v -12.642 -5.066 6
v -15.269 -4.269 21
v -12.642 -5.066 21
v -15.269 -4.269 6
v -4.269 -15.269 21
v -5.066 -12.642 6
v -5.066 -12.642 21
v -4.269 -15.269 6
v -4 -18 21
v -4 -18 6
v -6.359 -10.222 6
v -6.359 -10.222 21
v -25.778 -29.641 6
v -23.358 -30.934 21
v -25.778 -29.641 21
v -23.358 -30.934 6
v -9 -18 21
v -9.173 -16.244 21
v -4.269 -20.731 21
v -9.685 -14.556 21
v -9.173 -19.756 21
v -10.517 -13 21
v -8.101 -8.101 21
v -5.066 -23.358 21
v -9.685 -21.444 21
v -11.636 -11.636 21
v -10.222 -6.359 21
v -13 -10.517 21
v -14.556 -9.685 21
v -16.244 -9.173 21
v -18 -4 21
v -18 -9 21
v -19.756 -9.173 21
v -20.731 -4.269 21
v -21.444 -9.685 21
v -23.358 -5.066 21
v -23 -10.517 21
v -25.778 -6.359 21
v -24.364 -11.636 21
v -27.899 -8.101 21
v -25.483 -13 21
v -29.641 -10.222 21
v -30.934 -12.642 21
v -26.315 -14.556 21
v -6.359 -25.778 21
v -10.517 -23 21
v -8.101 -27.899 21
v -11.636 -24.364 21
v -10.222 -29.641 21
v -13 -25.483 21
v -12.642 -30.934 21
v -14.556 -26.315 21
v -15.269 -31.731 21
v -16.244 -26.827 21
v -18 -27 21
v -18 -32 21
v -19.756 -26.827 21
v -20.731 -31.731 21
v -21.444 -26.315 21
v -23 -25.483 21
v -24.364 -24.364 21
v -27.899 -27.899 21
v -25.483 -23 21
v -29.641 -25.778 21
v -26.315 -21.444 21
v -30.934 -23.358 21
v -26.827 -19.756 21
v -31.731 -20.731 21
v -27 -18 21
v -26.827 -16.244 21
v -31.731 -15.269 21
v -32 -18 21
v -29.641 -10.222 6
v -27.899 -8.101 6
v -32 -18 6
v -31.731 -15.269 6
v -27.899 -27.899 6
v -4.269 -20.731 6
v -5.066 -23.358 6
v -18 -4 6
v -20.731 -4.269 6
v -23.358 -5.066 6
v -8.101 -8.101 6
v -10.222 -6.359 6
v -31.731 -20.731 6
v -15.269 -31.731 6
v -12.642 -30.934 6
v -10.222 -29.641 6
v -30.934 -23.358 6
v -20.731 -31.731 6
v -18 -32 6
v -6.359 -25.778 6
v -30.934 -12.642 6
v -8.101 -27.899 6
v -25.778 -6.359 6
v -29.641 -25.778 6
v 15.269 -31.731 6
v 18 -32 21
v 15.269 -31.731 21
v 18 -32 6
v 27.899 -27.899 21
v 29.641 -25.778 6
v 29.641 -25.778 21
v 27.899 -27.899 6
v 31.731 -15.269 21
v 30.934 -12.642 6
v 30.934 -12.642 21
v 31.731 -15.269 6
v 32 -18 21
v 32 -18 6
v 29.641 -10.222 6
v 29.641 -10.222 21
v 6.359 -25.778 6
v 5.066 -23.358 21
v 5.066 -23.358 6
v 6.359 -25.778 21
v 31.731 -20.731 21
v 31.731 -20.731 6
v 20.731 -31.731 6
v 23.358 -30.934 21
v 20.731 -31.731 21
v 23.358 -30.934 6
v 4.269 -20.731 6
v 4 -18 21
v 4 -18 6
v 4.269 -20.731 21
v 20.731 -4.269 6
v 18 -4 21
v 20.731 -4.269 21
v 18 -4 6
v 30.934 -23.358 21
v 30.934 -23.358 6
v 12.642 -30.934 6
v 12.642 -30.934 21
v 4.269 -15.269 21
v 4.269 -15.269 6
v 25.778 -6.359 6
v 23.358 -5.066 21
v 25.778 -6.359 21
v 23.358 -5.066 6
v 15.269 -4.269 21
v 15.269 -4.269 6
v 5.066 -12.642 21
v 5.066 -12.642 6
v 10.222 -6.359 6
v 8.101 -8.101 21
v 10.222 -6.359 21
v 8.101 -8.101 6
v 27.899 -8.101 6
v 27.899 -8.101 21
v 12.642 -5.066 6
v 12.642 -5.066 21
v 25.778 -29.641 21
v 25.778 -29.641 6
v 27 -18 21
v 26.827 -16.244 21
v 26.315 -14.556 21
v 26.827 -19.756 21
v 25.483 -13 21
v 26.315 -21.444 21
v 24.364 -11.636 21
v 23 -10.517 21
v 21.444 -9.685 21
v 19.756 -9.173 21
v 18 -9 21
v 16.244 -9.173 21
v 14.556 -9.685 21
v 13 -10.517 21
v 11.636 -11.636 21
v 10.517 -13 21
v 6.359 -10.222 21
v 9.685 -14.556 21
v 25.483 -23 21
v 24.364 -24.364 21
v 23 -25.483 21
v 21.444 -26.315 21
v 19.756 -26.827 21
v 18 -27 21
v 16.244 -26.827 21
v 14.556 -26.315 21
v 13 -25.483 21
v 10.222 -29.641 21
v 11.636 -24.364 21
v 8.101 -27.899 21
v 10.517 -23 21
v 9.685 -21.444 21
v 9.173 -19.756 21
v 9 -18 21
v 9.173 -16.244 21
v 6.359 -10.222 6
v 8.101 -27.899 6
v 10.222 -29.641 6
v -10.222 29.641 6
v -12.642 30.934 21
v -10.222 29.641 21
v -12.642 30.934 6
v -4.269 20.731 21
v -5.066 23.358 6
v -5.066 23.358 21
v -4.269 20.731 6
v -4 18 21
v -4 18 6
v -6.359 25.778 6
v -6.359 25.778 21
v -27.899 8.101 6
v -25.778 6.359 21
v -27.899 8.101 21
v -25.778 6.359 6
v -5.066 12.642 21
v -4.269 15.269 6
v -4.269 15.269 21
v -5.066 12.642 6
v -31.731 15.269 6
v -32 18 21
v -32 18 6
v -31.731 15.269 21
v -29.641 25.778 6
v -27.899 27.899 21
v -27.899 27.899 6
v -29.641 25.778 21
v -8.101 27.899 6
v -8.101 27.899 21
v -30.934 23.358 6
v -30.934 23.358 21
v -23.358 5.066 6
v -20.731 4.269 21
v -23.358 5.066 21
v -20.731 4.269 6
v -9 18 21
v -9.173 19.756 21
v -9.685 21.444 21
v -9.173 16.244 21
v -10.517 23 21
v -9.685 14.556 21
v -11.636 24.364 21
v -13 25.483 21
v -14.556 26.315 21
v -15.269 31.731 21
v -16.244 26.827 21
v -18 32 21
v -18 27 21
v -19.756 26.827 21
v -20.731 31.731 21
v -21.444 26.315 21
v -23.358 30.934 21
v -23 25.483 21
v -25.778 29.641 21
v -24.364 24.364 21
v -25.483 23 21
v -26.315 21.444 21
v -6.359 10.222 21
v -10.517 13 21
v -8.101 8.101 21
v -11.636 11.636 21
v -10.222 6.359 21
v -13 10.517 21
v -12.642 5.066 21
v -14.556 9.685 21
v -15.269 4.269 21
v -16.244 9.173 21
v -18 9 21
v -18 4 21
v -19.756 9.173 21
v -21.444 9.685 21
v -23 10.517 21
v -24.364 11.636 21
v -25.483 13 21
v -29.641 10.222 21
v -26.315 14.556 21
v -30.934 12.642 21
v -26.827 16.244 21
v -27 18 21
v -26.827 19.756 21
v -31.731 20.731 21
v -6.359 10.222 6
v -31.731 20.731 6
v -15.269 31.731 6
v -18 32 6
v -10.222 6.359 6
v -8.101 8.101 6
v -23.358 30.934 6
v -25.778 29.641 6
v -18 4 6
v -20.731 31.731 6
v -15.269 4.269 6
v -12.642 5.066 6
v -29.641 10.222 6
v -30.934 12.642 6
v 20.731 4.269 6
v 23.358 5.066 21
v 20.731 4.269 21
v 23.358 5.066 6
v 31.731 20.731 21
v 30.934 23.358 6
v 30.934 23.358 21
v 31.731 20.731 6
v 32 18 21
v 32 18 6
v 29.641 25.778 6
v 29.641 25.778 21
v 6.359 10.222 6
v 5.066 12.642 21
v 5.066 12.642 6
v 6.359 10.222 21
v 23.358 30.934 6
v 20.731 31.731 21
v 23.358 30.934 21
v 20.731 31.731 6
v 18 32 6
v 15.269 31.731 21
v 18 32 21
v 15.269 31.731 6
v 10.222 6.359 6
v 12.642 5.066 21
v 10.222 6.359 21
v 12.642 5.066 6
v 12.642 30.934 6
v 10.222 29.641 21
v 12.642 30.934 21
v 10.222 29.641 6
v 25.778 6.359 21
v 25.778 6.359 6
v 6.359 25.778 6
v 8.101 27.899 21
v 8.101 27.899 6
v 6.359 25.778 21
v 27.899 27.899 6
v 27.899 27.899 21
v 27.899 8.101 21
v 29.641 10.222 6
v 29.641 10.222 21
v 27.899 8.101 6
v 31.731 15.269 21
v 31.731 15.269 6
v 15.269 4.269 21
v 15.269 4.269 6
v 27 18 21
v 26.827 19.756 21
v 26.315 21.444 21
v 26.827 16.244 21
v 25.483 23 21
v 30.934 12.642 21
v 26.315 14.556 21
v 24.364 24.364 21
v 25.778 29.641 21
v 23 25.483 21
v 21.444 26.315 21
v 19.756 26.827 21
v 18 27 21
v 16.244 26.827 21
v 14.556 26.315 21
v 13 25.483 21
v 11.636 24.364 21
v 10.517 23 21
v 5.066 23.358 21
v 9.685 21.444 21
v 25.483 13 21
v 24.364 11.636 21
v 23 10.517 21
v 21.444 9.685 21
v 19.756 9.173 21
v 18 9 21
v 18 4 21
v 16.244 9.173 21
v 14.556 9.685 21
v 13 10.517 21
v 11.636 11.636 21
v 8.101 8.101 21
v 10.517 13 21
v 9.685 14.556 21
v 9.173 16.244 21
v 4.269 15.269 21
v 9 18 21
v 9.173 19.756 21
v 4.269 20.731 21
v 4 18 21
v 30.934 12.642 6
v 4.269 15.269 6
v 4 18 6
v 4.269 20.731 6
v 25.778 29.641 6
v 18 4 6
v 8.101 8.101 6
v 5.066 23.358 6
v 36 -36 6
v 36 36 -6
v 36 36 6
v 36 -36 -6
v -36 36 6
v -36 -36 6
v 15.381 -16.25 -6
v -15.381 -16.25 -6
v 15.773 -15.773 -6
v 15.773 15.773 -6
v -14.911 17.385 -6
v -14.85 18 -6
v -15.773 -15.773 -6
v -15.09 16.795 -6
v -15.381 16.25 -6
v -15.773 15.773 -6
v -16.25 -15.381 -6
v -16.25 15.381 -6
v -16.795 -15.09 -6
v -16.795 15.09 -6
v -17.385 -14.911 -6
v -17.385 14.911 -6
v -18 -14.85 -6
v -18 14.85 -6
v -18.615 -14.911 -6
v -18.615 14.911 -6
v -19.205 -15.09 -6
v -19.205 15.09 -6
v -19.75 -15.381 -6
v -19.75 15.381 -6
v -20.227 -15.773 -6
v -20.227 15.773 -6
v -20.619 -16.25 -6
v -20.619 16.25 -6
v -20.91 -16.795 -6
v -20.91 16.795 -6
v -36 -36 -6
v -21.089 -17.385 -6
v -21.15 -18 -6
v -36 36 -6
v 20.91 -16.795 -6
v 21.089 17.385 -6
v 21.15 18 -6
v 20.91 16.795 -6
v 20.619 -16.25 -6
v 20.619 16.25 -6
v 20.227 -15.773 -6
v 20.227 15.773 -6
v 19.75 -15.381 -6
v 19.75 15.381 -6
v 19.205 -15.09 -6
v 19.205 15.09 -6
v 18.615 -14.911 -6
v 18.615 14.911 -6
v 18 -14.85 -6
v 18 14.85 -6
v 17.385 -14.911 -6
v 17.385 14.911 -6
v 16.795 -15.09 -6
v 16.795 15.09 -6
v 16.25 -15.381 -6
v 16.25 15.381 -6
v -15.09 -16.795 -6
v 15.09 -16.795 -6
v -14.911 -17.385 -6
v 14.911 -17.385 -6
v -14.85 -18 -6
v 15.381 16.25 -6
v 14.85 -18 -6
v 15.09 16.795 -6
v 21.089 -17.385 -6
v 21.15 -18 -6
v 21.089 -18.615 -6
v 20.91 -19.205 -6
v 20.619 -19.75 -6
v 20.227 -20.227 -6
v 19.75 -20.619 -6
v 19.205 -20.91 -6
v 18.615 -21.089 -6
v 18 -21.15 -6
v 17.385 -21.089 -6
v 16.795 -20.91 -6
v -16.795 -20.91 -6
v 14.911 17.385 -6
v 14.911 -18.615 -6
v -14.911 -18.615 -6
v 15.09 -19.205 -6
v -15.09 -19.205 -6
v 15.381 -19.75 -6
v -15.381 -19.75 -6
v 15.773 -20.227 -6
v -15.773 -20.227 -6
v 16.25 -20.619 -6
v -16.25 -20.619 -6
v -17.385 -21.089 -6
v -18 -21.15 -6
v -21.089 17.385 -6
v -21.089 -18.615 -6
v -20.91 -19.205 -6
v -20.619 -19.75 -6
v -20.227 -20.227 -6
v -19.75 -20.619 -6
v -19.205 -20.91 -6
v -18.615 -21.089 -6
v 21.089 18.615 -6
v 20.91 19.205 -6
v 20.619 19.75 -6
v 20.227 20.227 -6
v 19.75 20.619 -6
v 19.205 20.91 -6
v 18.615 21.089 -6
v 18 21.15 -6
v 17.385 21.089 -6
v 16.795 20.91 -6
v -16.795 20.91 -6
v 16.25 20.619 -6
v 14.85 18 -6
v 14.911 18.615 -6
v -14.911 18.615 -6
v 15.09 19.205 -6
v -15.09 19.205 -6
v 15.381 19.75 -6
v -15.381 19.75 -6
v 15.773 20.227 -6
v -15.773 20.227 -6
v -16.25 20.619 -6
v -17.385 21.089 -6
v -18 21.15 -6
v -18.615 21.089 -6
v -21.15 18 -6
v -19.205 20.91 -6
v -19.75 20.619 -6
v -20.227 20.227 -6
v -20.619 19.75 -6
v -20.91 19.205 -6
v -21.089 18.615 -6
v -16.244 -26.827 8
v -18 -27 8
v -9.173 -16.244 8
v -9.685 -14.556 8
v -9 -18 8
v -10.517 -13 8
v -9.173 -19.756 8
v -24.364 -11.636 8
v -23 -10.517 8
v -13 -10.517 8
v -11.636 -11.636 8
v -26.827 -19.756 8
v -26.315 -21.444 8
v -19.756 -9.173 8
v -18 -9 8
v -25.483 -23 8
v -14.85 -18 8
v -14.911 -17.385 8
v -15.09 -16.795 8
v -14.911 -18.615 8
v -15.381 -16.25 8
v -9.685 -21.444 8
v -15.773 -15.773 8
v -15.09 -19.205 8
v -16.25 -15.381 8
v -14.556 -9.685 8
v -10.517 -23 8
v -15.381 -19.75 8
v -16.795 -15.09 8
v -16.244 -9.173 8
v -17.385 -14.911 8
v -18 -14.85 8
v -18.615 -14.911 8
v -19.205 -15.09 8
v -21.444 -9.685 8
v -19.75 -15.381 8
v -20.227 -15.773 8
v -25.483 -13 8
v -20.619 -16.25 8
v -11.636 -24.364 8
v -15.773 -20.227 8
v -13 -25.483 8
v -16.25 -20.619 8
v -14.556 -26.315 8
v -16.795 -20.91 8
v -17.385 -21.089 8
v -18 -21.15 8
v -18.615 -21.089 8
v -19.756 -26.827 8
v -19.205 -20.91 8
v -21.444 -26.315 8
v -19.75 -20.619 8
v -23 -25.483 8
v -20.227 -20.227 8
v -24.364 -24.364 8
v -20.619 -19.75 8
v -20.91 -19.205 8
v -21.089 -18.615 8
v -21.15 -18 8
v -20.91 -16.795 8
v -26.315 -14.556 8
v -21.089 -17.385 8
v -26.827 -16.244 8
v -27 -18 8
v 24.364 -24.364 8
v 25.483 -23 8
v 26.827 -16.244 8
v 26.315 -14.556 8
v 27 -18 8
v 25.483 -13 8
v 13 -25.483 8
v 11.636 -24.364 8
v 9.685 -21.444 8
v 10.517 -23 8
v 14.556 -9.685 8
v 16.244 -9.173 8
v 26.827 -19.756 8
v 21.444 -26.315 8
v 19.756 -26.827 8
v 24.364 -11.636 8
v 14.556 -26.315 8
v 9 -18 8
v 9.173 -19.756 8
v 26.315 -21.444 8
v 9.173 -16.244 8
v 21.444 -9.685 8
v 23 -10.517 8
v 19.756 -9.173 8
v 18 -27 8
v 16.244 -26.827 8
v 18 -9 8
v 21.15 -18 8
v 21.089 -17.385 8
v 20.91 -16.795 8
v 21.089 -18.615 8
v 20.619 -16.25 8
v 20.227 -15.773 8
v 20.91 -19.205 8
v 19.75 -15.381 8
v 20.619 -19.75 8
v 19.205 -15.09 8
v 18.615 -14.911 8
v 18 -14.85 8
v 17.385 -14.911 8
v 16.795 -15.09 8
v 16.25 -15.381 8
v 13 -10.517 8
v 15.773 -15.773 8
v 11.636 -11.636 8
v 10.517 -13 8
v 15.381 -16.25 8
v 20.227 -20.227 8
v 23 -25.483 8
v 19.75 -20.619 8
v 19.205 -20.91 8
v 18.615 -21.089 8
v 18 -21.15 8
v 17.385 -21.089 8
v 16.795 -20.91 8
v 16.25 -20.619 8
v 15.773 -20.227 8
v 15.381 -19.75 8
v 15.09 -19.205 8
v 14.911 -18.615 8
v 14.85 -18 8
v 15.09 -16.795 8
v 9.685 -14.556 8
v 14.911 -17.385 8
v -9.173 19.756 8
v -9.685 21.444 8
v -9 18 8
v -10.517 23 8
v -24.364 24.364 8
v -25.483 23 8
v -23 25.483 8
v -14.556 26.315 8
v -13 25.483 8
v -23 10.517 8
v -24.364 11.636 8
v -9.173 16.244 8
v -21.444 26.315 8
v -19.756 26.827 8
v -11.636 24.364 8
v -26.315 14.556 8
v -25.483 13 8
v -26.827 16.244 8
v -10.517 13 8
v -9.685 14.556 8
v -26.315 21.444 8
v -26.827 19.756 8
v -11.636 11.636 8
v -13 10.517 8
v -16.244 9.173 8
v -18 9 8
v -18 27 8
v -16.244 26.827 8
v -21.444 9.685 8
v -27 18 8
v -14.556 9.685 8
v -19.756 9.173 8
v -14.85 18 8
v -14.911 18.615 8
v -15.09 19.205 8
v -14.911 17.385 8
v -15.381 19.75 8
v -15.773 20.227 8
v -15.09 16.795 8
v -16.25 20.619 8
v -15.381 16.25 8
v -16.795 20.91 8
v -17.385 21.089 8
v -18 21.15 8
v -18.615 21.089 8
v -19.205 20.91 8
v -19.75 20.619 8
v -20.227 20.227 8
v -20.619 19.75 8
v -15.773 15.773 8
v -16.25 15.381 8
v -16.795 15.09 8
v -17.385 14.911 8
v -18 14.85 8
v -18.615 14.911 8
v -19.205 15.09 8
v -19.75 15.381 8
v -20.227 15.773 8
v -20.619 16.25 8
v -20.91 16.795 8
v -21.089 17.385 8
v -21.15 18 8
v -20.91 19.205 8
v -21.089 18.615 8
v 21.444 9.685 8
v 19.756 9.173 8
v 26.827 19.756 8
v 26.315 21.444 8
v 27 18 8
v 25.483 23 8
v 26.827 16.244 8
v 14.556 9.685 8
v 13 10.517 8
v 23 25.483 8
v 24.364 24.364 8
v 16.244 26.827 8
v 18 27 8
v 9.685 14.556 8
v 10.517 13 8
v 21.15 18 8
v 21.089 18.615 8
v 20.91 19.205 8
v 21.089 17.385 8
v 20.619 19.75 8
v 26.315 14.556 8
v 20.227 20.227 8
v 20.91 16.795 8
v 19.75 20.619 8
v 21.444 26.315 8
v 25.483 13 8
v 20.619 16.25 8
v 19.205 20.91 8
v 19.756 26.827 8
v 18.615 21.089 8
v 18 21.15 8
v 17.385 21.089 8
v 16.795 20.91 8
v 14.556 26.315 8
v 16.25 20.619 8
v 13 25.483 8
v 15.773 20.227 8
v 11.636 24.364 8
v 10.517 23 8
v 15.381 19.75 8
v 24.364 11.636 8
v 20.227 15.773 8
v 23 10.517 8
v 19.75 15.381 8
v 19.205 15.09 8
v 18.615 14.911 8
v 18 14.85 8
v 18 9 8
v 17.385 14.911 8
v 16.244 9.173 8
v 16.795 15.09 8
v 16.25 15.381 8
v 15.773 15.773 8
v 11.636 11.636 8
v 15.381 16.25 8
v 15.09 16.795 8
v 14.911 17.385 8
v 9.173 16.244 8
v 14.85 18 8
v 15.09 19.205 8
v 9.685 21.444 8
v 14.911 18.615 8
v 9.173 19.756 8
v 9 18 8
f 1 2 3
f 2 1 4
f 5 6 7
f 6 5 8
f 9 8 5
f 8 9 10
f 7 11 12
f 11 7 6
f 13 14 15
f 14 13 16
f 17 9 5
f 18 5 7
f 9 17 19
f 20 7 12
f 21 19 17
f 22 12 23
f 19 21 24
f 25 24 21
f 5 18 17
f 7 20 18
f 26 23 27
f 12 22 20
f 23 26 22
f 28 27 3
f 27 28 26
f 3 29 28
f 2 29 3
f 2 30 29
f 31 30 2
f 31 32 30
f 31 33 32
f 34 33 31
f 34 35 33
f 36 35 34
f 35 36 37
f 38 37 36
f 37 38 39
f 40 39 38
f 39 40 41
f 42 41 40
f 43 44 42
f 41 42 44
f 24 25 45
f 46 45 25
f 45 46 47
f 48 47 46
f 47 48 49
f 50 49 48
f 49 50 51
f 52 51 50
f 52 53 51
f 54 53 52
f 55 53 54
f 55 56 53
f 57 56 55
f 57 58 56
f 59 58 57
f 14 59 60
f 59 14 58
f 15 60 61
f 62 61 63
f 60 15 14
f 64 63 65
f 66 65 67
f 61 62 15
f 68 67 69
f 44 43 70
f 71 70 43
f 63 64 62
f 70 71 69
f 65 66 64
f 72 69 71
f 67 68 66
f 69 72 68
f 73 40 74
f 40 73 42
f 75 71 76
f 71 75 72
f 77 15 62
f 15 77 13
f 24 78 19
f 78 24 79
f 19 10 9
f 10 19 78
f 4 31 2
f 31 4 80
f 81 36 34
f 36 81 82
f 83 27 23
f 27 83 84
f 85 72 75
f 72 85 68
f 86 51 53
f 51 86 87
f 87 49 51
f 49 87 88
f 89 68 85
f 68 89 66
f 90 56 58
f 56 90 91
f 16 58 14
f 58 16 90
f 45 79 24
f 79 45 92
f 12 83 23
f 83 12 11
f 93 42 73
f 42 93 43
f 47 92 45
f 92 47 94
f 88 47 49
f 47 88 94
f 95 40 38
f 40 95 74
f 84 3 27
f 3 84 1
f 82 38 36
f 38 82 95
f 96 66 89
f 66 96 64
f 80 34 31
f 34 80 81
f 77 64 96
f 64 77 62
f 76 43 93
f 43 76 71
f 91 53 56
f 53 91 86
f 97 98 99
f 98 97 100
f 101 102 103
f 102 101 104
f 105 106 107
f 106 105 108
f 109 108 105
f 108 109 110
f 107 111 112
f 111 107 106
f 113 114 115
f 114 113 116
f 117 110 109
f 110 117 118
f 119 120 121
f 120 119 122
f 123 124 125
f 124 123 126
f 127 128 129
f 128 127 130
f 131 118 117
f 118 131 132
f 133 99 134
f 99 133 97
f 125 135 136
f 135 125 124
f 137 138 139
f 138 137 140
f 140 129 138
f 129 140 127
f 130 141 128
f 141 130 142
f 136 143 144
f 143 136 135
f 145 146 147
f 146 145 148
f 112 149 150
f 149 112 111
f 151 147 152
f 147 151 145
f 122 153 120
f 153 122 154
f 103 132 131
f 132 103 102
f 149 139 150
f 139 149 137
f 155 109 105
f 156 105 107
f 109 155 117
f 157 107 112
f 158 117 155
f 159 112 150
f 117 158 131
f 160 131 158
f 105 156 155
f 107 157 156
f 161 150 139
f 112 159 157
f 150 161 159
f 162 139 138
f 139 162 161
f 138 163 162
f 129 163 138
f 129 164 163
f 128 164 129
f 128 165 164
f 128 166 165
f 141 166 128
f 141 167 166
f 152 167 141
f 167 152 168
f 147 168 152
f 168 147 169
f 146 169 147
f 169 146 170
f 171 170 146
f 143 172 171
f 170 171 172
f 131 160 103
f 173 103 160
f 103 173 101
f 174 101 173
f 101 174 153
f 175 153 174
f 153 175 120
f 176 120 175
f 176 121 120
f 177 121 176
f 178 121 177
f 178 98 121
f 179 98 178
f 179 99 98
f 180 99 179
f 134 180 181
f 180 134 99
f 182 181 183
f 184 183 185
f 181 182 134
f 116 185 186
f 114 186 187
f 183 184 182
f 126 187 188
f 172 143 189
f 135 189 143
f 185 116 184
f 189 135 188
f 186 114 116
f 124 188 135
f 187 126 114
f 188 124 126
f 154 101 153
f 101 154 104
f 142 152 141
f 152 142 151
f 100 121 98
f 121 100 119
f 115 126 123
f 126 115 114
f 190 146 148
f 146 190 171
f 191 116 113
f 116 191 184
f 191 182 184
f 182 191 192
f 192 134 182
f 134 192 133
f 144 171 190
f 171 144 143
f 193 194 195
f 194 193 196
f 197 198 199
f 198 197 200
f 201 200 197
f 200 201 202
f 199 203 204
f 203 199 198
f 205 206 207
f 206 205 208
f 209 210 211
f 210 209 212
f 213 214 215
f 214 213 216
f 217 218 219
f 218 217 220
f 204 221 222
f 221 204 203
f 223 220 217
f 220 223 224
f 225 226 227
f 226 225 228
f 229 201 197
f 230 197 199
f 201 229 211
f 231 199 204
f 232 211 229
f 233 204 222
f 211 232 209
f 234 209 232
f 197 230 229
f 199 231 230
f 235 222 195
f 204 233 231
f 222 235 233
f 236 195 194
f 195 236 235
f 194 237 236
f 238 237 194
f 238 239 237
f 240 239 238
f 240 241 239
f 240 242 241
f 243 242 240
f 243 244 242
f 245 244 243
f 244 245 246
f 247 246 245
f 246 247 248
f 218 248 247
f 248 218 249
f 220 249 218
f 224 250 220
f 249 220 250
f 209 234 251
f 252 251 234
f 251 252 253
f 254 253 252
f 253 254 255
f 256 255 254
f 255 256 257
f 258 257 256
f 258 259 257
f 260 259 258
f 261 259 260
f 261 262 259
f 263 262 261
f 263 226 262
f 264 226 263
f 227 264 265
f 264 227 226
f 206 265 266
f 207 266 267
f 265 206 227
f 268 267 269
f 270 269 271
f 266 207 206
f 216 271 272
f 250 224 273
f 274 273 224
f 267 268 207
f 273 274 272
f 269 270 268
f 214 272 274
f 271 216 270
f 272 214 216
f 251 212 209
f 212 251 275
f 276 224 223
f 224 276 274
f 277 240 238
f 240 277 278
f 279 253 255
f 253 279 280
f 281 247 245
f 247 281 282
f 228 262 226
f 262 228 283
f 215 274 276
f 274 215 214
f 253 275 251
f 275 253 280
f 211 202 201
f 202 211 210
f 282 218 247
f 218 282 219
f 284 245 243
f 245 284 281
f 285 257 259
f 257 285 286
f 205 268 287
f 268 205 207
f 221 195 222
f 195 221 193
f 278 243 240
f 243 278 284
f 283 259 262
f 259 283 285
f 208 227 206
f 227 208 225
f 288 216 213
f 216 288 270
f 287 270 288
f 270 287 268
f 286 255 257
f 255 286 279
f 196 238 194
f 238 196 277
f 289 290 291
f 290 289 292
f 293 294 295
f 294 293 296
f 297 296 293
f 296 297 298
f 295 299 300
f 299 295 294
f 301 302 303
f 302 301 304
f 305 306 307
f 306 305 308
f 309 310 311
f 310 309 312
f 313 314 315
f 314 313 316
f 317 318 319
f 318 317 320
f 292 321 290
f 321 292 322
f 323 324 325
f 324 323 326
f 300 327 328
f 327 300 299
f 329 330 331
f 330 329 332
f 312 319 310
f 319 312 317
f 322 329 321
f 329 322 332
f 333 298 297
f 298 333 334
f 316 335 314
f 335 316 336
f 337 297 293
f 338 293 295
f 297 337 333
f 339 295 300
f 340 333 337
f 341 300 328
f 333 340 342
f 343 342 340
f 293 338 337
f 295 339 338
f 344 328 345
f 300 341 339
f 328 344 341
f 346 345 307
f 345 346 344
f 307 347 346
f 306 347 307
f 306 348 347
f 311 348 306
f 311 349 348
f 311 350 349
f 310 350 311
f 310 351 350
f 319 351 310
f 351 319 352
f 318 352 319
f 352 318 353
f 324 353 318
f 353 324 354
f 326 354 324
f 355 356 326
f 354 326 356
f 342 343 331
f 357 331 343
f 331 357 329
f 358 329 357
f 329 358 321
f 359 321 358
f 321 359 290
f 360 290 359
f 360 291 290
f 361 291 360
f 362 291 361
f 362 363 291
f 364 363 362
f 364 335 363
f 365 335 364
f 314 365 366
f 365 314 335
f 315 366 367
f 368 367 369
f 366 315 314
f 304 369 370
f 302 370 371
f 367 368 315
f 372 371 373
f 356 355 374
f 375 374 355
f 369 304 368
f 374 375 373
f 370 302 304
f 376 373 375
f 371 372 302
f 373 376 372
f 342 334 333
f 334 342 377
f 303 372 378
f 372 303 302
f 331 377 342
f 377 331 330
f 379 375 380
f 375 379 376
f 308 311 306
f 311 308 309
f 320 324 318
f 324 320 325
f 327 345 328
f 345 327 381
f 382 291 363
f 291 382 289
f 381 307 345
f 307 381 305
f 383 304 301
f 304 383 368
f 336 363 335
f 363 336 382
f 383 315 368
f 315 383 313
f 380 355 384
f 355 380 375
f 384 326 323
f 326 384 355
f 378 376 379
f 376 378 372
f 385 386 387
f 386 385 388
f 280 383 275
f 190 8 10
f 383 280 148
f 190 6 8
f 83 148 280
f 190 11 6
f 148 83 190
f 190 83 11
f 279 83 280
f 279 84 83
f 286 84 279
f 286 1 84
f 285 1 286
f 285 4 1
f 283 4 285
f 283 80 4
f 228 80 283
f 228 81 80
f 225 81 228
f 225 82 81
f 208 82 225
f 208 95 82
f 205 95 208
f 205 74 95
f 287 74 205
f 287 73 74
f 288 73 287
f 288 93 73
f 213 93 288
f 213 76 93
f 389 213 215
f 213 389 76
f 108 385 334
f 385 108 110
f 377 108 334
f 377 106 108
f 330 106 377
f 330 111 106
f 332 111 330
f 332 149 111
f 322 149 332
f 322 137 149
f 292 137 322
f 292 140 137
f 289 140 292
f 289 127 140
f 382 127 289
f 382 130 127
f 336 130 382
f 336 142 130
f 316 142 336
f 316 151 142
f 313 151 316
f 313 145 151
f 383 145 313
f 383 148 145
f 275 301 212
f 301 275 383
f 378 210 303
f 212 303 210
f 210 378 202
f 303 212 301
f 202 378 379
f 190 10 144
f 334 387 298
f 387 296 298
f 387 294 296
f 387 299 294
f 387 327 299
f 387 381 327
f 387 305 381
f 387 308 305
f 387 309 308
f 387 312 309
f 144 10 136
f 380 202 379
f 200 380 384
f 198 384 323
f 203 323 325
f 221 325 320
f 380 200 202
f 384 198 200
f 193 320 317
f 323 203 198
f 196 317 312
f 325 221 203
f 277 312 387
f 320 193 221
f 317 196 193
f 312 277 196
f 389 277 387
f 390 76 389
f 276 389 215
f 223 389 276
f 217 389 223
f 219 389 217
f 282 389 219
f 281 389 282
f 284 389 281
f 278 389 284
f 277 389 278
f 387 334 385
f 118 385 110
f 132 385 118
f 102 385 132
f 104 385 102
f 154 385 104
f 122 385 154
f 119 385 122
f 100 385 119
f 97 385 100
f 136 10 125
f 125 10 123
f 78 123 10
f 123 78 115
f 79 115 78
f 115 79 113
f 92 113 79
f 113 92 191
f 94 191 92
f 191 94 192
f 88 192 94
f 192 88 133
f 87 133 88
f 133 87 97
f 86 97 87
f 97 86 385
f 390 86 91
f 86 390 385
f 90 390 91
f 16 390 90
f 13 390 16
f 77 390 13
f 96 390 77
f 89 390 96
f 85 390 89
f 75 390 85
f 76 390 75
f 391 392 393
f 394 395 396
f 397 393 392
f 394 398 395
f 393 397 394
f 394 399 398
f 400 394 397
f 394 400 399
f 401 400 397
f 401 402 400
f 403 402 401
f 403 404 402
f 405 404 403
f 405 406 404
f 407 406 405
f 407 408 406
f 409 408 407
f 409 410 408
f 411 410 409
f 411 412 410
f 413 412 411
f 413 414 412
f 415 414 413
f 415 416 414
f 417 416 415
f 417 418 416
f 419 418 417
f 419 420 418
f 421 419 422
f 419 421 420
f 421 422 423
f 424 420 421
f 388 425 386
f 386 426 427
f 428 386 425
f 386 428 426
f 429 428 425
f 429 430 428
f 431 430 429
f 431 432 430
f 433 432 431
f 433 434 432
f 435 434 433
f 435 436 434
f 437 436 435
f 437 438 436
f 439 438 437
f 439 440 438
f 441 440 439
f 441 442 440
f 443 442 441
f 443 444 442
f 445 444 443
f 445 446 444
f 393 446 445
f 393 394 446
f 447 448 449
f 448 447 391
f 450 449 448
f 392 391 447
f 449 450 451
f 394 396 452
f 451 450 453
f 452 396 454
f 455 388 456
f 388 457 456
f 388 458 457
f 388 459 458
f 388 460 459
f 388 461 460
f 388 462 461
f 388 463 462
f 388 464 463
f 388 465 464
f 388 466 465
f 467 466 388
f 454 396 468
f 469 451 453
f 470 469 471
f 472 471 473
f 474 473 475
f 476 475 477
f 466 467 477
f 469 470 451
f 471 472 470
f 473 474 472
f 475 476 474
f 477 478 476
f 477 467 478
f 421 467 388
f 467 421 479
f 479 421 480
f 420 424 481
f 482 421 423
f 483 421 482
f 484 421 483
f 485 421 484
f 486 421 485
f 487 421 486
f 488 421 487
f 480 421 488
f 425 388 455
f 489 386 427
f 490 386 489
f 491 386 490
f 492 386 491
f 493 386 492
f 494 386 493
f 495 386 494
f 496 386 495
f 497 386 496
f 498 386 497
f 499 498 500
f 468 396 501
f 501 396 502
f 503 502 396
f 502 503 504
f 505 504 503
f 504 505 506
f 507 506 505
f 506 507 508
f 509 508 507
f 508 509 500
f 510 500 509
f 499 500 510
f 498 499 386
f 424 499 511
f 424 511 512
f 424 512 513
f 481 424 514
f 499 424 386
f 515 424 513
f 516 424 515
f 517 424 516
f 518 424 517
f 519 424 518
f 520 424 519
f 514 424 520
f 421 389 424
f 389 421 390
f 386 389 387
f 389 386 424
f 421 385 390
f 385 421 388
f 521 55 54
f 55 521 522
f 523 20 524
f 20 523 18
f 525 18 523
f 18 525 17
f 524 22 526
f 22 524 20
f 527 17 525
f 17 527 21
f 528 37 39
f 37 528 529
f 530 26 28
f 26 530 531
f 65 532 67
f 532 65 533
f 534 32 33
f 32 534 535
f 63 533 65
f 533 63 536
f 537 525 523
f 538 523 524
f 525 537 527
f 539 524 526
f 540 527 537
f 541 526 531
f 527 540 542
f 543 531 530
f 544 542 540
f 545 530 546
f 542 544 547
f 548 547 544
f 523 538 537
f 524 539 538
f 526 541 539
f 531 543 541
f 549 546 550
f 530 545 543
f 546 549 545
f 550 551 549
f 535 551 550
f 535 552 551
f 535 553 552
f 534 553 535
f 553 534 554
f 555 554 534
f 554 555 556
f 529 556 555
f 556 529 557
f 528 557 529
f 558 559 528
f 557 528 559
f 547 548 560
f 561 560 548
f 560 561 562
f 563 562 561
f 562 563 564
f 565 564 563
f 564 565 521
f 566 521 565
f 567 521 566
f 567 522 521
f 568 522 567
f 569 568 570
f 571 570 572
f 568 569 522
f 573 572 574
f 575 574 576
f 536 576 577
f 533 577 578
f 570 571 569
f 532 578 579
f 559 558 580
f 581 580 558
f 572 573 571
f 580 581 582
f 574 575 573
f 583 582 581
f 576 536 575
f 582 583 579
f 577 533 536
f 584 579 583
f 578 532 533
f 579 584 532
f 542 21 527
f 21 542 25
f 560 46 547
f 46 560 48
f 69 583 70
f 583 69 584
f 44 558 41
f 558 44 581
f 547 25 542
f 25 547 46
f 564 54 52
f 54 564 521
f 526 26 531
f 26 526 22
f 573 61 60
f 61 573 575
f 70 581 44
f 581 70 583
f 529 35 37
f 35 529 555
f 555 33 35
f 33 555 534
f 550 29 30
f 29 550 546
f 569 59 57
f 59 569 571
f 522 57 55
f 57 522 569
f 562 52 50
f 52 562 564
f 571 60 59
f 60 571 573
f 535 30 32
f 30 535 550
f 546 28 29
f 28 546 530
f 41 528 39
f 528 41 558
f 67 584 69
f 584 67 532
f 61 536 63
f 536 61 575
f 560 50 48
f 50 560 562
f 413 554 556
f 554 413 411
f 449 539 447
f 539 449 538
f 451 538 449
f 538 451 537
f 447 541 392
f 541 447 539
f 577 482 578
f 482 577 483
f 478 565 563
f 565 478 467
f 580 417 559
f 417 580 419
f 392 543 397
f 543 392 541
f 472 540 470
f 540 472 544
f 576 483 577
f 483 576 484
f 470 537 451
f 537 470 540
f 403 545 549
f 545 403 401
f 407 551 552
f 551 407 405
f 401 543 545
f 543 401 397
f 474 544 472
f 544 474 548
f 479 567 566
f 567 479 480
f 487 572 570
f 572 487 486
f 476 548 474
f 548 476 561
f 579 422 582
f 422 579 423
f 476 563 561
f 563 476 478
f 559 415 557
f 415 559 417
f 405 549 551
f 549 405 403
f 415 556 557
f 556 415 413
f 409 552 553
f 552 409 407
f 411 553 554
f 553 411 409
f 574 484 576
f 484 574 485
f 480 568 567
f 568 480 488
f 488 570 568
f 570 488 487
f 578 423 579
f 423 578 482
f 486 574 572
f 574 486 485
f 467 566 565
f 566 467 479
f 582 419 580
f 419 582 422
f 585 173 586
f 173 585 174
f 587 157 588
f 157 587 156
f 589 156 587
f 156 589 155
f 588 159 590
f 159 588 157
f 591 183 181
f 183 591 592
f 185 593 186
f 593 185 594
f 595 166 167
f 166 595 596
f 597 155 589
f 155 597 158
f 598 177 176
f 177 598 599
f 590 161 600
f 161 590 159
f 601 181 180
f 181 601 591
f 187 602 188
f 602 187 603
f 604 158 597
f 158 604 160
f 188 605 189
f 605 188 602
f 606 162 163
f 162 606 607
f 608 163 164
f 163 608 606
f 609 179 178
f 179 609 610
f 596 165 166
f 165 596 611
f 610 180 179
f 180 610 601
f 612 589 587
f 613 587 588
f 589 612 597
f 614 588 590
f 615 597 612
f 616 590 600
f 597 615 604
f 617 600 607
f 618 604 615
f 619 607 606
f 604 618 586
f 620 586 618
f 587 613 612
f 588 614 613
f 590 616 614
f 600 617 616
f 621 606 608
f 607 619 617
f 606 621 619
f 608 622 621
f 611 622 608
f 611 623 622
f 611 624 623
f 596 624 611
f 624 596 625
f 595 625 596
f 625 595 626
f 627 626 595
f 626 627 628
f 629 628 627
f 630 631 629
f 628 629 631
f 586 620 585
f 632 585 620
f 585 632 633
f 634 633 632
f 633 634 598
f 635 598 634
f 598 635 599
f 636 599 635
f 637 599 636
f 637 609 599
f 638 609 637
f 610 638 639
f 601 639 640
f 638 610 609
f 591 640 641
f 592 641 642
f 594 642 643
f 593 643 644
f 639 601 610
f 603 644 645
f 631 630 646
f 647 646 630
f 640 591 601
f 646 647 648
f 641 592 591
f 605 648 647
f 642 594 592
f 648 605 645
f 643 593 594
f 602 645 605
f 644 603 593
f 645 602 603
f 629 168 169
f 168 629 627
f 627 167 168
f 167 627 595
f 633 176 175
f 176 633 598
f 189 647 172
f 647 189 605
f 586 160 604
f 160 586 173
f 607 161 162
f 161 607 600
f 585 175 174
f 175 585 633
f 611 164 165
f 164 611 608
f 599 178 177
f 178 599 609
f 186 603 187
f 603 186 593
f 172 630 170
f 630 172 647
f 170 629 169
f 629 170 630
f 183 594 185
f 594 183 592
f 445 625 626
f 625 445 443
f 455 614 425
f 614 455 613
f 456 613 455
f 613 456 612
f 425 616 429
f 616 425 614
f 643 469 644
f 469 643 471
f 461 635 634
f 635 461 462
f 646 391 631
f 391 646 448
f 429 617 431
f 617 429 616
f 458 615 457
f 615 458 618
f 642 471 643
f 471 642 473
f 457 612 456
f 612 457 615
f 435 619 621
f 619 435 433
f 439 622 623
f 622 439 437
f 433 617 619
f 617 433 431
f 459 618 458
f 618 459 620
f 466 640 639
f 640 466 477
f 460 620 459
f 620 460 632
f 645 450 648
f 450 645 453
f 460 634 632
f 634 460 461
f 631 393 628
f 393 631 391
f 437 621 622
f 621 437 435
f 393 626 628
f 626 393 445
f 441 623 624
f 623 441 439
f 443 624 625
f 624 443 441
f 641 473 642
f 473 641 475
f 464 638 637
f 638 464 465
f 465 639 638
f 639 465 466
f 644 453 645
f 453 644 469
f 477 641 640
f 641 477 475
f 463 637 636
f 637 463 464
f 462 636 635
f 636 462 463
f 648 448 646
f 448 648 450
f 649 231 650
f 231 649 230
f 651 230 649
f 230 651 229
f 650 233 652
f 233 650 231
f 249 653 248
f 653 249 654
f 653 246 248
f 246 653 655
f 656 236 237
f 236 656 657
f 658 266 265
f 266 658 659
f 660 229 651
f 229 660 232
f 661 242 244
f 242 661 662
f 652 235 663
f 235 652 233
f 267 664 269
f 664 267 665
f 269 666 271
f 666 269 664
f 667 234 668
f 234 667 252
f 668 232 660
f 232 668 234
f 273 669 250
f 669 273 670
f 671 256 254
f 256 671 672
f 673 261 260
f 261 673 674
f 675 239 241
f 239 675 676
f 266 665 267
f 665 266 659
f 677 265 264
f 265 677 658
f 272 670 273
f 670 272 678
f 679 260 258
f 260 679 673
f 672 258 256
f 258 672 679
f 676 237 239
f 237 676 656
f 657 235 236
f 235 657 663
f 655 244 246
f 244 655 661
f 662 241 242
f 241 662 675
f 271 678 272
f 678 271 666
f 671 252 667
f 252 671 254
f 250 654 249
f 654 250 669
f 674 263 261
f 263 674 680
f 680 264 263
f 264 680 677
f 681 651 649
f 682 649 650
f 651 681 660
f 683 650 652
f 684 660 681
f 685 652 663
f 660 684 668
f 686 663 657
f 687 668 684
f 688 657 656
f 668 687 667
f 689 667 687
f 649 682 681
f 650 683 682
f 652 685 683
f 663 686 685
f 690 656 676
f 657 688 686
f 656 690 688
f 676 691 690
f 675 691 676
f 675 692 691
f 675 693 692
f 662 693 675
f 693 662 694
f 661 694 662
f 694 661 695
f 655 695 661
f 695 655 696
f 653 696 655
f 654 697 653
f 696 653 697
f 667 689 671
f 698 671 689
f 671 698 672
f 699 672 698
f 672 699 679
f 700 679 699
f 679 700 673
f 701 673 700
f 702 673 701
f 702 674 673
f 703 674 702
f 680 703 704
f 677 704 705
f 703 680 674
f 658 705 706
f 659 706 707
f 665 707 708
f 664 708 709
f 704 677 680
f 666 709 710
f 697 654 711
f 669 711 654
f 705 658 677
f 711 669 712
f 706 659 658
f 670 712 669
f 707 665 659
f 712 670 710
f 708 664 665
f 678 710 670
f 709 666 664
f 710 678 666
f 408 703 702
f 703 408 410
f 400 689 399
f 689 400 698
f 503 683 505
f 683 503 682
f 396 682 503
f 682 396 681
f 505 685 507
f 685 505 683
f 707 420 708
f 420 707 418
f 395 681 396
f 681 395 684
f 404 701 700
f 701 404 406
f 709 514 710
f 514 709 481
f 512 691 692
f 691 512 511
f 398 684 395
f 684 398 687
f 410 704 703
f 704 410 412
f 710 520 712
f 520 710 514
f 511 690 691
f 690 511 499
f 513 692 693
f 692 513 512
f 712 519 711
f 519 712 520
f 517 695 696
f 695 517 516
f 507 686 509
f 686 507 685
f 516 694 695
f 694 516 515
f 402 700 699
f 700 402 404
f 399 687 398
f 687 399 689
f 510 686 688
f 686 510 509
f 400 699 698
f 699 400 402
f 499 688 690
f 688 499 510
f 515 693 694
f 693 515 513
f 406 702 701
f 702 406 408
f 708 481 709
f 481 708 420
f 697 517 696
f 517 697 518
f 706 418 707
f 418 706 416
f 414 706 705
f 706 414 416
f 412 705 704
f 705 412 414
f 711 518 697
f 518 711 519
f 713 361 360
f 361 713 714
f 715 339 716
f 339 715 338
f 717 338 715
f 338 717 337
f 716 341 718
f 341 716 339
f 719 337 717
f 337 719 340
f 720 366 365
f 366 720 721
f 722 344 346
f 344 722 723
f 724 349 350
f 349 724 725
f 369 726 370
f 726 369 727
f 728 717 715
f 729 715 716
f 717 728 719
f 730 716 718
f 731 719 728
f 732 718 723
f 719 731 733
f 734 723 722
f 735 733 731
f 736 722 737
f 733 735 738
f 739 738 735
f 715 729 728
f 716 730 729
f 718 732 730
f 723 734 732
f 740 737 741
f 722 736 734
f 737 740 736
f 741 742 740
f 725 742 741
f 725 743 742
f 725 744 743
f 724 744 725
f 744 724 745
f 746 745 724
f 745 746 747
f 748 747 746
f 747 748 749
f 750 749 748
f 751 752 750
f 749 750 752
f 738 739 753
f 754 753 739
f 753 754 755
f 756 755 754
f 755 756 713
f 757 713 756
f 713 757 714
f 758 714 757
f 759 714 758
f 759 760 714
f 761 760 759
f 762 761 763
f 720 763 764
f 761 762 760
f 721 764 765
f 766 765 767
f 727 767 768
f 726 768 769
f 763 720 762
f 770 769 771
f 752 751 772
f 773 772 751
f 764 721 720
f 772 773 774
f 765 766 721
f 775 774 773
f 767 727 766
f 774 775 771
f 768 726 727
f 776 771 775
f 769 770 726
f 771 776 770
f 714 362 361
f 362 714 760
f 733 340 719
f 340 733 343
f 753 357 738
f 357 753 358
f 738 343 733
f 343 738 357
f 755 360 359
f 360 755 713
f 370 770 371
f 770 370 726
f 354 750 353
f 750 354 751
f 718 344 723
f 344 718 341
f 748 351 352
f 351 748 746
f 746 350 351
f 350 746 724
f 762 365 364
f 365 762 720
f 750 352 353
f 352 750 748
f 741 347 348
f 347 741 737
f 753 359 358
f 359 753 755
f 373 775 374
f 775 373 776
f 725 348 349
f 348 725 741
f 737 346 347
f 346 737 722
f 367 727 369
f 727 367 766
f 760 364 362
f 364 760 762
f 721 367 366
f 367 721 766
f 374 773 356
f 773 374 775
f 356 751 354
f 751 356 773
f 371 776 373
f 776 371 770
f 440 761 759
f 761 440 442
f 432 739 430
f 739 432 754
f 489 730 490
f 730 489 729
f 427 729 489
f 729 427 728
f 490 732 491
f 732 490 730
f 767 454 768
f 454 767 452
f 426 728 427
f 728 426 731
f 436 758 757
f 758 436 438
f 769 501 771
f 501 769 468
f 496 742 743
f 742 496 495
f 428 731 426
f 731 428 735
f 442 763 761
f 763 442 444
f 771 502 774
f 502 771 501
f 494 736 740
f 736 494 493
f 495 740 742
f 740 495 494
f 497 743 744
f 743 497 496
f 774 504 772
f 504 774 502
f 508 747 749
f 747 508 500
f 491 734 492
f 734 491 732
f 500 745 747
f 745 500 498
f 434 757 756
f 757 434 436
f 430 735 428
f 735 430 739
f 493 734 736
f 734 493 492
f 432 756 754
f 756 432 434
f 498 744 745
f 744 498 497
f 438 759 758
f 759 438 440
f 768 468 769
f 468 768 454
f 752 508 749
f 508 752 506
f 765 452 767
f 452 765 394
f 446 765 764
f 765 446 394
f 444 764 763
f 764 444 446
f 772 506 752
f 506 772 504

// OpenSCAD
$fn = 32;

// ----------------------------------------------------------------------
// Socket pad plate
// bosses with counterbored sockets for the screws
// ----------------------------------------------------------------------

// --- parameters (mm) ---
base_t = 12;        // base plate thickness
boss_h = 15;        // boss height above the base plate
boss_d = 28;        // boss diameter
socket_d = 18;      // socket diameter
socket_depth = 13;  // socket depth from the boss face
bolt_d = 6.3;       // screw clearance hole through the socket floor
rows = 2;           // boss rows
cols = 2;           // bosses per row
pitch = 36;         // boss pitch

// --- derived feature positions (mm) ---
height = base_t + boss_h;           // = 27   overall height of the part
plate = [pitch * (cols - 1) + boss_d + 8, pitch * (rows - 1) + boss_d + 8, base_t];  // = [72, 72, 12]   overall size (x, y, z)
span_x = pitch * (cols - 1);        // = 36   distance between outer bosses
span_y = pitch * (rows - 1);        // = 36   distance between boss rows
origin_x = -span_x / 2;             // = -18   X of the first boss
origin_y = -span_y / 2;             // = -18   Y of the first boss
feature_centers = [
  [origin_x + 0 * pitch, origin_y + 0 * pitch],
  [origin_x + 1 * pitch, origin_y + 0 * pitch],
  [origin_x + 0 * pitch, origin_y + 1 * pitch],
  [origin_x + 1 * pitch, origin_y + 1 * pitch]
];   // boss centres: sockets, holes and the pads themselves are placed from here

// base plate, bosses on feature_centers, socket + through hole in each
difference() {
  union() {
    cube(plate, center = true);
    for (centre = feature_centers)
      translate([centre[0], centre[1], plate[2] / 2 - 1])
        cylinder(d = boss_d, h = boss_h + 1);
  }
  for (centre = feature_centers) {
    translate([centre[0], centre[1], plate[2] / 2 + boss_h - socket_depth])
      cylinder(d = socket_d, h = socket_depth + 1);
    translate([centre[0], centre[1], -height])
      cylinder(d = bolt_d, h = 2 * height + 2);  // through the socket floor
  }
}
